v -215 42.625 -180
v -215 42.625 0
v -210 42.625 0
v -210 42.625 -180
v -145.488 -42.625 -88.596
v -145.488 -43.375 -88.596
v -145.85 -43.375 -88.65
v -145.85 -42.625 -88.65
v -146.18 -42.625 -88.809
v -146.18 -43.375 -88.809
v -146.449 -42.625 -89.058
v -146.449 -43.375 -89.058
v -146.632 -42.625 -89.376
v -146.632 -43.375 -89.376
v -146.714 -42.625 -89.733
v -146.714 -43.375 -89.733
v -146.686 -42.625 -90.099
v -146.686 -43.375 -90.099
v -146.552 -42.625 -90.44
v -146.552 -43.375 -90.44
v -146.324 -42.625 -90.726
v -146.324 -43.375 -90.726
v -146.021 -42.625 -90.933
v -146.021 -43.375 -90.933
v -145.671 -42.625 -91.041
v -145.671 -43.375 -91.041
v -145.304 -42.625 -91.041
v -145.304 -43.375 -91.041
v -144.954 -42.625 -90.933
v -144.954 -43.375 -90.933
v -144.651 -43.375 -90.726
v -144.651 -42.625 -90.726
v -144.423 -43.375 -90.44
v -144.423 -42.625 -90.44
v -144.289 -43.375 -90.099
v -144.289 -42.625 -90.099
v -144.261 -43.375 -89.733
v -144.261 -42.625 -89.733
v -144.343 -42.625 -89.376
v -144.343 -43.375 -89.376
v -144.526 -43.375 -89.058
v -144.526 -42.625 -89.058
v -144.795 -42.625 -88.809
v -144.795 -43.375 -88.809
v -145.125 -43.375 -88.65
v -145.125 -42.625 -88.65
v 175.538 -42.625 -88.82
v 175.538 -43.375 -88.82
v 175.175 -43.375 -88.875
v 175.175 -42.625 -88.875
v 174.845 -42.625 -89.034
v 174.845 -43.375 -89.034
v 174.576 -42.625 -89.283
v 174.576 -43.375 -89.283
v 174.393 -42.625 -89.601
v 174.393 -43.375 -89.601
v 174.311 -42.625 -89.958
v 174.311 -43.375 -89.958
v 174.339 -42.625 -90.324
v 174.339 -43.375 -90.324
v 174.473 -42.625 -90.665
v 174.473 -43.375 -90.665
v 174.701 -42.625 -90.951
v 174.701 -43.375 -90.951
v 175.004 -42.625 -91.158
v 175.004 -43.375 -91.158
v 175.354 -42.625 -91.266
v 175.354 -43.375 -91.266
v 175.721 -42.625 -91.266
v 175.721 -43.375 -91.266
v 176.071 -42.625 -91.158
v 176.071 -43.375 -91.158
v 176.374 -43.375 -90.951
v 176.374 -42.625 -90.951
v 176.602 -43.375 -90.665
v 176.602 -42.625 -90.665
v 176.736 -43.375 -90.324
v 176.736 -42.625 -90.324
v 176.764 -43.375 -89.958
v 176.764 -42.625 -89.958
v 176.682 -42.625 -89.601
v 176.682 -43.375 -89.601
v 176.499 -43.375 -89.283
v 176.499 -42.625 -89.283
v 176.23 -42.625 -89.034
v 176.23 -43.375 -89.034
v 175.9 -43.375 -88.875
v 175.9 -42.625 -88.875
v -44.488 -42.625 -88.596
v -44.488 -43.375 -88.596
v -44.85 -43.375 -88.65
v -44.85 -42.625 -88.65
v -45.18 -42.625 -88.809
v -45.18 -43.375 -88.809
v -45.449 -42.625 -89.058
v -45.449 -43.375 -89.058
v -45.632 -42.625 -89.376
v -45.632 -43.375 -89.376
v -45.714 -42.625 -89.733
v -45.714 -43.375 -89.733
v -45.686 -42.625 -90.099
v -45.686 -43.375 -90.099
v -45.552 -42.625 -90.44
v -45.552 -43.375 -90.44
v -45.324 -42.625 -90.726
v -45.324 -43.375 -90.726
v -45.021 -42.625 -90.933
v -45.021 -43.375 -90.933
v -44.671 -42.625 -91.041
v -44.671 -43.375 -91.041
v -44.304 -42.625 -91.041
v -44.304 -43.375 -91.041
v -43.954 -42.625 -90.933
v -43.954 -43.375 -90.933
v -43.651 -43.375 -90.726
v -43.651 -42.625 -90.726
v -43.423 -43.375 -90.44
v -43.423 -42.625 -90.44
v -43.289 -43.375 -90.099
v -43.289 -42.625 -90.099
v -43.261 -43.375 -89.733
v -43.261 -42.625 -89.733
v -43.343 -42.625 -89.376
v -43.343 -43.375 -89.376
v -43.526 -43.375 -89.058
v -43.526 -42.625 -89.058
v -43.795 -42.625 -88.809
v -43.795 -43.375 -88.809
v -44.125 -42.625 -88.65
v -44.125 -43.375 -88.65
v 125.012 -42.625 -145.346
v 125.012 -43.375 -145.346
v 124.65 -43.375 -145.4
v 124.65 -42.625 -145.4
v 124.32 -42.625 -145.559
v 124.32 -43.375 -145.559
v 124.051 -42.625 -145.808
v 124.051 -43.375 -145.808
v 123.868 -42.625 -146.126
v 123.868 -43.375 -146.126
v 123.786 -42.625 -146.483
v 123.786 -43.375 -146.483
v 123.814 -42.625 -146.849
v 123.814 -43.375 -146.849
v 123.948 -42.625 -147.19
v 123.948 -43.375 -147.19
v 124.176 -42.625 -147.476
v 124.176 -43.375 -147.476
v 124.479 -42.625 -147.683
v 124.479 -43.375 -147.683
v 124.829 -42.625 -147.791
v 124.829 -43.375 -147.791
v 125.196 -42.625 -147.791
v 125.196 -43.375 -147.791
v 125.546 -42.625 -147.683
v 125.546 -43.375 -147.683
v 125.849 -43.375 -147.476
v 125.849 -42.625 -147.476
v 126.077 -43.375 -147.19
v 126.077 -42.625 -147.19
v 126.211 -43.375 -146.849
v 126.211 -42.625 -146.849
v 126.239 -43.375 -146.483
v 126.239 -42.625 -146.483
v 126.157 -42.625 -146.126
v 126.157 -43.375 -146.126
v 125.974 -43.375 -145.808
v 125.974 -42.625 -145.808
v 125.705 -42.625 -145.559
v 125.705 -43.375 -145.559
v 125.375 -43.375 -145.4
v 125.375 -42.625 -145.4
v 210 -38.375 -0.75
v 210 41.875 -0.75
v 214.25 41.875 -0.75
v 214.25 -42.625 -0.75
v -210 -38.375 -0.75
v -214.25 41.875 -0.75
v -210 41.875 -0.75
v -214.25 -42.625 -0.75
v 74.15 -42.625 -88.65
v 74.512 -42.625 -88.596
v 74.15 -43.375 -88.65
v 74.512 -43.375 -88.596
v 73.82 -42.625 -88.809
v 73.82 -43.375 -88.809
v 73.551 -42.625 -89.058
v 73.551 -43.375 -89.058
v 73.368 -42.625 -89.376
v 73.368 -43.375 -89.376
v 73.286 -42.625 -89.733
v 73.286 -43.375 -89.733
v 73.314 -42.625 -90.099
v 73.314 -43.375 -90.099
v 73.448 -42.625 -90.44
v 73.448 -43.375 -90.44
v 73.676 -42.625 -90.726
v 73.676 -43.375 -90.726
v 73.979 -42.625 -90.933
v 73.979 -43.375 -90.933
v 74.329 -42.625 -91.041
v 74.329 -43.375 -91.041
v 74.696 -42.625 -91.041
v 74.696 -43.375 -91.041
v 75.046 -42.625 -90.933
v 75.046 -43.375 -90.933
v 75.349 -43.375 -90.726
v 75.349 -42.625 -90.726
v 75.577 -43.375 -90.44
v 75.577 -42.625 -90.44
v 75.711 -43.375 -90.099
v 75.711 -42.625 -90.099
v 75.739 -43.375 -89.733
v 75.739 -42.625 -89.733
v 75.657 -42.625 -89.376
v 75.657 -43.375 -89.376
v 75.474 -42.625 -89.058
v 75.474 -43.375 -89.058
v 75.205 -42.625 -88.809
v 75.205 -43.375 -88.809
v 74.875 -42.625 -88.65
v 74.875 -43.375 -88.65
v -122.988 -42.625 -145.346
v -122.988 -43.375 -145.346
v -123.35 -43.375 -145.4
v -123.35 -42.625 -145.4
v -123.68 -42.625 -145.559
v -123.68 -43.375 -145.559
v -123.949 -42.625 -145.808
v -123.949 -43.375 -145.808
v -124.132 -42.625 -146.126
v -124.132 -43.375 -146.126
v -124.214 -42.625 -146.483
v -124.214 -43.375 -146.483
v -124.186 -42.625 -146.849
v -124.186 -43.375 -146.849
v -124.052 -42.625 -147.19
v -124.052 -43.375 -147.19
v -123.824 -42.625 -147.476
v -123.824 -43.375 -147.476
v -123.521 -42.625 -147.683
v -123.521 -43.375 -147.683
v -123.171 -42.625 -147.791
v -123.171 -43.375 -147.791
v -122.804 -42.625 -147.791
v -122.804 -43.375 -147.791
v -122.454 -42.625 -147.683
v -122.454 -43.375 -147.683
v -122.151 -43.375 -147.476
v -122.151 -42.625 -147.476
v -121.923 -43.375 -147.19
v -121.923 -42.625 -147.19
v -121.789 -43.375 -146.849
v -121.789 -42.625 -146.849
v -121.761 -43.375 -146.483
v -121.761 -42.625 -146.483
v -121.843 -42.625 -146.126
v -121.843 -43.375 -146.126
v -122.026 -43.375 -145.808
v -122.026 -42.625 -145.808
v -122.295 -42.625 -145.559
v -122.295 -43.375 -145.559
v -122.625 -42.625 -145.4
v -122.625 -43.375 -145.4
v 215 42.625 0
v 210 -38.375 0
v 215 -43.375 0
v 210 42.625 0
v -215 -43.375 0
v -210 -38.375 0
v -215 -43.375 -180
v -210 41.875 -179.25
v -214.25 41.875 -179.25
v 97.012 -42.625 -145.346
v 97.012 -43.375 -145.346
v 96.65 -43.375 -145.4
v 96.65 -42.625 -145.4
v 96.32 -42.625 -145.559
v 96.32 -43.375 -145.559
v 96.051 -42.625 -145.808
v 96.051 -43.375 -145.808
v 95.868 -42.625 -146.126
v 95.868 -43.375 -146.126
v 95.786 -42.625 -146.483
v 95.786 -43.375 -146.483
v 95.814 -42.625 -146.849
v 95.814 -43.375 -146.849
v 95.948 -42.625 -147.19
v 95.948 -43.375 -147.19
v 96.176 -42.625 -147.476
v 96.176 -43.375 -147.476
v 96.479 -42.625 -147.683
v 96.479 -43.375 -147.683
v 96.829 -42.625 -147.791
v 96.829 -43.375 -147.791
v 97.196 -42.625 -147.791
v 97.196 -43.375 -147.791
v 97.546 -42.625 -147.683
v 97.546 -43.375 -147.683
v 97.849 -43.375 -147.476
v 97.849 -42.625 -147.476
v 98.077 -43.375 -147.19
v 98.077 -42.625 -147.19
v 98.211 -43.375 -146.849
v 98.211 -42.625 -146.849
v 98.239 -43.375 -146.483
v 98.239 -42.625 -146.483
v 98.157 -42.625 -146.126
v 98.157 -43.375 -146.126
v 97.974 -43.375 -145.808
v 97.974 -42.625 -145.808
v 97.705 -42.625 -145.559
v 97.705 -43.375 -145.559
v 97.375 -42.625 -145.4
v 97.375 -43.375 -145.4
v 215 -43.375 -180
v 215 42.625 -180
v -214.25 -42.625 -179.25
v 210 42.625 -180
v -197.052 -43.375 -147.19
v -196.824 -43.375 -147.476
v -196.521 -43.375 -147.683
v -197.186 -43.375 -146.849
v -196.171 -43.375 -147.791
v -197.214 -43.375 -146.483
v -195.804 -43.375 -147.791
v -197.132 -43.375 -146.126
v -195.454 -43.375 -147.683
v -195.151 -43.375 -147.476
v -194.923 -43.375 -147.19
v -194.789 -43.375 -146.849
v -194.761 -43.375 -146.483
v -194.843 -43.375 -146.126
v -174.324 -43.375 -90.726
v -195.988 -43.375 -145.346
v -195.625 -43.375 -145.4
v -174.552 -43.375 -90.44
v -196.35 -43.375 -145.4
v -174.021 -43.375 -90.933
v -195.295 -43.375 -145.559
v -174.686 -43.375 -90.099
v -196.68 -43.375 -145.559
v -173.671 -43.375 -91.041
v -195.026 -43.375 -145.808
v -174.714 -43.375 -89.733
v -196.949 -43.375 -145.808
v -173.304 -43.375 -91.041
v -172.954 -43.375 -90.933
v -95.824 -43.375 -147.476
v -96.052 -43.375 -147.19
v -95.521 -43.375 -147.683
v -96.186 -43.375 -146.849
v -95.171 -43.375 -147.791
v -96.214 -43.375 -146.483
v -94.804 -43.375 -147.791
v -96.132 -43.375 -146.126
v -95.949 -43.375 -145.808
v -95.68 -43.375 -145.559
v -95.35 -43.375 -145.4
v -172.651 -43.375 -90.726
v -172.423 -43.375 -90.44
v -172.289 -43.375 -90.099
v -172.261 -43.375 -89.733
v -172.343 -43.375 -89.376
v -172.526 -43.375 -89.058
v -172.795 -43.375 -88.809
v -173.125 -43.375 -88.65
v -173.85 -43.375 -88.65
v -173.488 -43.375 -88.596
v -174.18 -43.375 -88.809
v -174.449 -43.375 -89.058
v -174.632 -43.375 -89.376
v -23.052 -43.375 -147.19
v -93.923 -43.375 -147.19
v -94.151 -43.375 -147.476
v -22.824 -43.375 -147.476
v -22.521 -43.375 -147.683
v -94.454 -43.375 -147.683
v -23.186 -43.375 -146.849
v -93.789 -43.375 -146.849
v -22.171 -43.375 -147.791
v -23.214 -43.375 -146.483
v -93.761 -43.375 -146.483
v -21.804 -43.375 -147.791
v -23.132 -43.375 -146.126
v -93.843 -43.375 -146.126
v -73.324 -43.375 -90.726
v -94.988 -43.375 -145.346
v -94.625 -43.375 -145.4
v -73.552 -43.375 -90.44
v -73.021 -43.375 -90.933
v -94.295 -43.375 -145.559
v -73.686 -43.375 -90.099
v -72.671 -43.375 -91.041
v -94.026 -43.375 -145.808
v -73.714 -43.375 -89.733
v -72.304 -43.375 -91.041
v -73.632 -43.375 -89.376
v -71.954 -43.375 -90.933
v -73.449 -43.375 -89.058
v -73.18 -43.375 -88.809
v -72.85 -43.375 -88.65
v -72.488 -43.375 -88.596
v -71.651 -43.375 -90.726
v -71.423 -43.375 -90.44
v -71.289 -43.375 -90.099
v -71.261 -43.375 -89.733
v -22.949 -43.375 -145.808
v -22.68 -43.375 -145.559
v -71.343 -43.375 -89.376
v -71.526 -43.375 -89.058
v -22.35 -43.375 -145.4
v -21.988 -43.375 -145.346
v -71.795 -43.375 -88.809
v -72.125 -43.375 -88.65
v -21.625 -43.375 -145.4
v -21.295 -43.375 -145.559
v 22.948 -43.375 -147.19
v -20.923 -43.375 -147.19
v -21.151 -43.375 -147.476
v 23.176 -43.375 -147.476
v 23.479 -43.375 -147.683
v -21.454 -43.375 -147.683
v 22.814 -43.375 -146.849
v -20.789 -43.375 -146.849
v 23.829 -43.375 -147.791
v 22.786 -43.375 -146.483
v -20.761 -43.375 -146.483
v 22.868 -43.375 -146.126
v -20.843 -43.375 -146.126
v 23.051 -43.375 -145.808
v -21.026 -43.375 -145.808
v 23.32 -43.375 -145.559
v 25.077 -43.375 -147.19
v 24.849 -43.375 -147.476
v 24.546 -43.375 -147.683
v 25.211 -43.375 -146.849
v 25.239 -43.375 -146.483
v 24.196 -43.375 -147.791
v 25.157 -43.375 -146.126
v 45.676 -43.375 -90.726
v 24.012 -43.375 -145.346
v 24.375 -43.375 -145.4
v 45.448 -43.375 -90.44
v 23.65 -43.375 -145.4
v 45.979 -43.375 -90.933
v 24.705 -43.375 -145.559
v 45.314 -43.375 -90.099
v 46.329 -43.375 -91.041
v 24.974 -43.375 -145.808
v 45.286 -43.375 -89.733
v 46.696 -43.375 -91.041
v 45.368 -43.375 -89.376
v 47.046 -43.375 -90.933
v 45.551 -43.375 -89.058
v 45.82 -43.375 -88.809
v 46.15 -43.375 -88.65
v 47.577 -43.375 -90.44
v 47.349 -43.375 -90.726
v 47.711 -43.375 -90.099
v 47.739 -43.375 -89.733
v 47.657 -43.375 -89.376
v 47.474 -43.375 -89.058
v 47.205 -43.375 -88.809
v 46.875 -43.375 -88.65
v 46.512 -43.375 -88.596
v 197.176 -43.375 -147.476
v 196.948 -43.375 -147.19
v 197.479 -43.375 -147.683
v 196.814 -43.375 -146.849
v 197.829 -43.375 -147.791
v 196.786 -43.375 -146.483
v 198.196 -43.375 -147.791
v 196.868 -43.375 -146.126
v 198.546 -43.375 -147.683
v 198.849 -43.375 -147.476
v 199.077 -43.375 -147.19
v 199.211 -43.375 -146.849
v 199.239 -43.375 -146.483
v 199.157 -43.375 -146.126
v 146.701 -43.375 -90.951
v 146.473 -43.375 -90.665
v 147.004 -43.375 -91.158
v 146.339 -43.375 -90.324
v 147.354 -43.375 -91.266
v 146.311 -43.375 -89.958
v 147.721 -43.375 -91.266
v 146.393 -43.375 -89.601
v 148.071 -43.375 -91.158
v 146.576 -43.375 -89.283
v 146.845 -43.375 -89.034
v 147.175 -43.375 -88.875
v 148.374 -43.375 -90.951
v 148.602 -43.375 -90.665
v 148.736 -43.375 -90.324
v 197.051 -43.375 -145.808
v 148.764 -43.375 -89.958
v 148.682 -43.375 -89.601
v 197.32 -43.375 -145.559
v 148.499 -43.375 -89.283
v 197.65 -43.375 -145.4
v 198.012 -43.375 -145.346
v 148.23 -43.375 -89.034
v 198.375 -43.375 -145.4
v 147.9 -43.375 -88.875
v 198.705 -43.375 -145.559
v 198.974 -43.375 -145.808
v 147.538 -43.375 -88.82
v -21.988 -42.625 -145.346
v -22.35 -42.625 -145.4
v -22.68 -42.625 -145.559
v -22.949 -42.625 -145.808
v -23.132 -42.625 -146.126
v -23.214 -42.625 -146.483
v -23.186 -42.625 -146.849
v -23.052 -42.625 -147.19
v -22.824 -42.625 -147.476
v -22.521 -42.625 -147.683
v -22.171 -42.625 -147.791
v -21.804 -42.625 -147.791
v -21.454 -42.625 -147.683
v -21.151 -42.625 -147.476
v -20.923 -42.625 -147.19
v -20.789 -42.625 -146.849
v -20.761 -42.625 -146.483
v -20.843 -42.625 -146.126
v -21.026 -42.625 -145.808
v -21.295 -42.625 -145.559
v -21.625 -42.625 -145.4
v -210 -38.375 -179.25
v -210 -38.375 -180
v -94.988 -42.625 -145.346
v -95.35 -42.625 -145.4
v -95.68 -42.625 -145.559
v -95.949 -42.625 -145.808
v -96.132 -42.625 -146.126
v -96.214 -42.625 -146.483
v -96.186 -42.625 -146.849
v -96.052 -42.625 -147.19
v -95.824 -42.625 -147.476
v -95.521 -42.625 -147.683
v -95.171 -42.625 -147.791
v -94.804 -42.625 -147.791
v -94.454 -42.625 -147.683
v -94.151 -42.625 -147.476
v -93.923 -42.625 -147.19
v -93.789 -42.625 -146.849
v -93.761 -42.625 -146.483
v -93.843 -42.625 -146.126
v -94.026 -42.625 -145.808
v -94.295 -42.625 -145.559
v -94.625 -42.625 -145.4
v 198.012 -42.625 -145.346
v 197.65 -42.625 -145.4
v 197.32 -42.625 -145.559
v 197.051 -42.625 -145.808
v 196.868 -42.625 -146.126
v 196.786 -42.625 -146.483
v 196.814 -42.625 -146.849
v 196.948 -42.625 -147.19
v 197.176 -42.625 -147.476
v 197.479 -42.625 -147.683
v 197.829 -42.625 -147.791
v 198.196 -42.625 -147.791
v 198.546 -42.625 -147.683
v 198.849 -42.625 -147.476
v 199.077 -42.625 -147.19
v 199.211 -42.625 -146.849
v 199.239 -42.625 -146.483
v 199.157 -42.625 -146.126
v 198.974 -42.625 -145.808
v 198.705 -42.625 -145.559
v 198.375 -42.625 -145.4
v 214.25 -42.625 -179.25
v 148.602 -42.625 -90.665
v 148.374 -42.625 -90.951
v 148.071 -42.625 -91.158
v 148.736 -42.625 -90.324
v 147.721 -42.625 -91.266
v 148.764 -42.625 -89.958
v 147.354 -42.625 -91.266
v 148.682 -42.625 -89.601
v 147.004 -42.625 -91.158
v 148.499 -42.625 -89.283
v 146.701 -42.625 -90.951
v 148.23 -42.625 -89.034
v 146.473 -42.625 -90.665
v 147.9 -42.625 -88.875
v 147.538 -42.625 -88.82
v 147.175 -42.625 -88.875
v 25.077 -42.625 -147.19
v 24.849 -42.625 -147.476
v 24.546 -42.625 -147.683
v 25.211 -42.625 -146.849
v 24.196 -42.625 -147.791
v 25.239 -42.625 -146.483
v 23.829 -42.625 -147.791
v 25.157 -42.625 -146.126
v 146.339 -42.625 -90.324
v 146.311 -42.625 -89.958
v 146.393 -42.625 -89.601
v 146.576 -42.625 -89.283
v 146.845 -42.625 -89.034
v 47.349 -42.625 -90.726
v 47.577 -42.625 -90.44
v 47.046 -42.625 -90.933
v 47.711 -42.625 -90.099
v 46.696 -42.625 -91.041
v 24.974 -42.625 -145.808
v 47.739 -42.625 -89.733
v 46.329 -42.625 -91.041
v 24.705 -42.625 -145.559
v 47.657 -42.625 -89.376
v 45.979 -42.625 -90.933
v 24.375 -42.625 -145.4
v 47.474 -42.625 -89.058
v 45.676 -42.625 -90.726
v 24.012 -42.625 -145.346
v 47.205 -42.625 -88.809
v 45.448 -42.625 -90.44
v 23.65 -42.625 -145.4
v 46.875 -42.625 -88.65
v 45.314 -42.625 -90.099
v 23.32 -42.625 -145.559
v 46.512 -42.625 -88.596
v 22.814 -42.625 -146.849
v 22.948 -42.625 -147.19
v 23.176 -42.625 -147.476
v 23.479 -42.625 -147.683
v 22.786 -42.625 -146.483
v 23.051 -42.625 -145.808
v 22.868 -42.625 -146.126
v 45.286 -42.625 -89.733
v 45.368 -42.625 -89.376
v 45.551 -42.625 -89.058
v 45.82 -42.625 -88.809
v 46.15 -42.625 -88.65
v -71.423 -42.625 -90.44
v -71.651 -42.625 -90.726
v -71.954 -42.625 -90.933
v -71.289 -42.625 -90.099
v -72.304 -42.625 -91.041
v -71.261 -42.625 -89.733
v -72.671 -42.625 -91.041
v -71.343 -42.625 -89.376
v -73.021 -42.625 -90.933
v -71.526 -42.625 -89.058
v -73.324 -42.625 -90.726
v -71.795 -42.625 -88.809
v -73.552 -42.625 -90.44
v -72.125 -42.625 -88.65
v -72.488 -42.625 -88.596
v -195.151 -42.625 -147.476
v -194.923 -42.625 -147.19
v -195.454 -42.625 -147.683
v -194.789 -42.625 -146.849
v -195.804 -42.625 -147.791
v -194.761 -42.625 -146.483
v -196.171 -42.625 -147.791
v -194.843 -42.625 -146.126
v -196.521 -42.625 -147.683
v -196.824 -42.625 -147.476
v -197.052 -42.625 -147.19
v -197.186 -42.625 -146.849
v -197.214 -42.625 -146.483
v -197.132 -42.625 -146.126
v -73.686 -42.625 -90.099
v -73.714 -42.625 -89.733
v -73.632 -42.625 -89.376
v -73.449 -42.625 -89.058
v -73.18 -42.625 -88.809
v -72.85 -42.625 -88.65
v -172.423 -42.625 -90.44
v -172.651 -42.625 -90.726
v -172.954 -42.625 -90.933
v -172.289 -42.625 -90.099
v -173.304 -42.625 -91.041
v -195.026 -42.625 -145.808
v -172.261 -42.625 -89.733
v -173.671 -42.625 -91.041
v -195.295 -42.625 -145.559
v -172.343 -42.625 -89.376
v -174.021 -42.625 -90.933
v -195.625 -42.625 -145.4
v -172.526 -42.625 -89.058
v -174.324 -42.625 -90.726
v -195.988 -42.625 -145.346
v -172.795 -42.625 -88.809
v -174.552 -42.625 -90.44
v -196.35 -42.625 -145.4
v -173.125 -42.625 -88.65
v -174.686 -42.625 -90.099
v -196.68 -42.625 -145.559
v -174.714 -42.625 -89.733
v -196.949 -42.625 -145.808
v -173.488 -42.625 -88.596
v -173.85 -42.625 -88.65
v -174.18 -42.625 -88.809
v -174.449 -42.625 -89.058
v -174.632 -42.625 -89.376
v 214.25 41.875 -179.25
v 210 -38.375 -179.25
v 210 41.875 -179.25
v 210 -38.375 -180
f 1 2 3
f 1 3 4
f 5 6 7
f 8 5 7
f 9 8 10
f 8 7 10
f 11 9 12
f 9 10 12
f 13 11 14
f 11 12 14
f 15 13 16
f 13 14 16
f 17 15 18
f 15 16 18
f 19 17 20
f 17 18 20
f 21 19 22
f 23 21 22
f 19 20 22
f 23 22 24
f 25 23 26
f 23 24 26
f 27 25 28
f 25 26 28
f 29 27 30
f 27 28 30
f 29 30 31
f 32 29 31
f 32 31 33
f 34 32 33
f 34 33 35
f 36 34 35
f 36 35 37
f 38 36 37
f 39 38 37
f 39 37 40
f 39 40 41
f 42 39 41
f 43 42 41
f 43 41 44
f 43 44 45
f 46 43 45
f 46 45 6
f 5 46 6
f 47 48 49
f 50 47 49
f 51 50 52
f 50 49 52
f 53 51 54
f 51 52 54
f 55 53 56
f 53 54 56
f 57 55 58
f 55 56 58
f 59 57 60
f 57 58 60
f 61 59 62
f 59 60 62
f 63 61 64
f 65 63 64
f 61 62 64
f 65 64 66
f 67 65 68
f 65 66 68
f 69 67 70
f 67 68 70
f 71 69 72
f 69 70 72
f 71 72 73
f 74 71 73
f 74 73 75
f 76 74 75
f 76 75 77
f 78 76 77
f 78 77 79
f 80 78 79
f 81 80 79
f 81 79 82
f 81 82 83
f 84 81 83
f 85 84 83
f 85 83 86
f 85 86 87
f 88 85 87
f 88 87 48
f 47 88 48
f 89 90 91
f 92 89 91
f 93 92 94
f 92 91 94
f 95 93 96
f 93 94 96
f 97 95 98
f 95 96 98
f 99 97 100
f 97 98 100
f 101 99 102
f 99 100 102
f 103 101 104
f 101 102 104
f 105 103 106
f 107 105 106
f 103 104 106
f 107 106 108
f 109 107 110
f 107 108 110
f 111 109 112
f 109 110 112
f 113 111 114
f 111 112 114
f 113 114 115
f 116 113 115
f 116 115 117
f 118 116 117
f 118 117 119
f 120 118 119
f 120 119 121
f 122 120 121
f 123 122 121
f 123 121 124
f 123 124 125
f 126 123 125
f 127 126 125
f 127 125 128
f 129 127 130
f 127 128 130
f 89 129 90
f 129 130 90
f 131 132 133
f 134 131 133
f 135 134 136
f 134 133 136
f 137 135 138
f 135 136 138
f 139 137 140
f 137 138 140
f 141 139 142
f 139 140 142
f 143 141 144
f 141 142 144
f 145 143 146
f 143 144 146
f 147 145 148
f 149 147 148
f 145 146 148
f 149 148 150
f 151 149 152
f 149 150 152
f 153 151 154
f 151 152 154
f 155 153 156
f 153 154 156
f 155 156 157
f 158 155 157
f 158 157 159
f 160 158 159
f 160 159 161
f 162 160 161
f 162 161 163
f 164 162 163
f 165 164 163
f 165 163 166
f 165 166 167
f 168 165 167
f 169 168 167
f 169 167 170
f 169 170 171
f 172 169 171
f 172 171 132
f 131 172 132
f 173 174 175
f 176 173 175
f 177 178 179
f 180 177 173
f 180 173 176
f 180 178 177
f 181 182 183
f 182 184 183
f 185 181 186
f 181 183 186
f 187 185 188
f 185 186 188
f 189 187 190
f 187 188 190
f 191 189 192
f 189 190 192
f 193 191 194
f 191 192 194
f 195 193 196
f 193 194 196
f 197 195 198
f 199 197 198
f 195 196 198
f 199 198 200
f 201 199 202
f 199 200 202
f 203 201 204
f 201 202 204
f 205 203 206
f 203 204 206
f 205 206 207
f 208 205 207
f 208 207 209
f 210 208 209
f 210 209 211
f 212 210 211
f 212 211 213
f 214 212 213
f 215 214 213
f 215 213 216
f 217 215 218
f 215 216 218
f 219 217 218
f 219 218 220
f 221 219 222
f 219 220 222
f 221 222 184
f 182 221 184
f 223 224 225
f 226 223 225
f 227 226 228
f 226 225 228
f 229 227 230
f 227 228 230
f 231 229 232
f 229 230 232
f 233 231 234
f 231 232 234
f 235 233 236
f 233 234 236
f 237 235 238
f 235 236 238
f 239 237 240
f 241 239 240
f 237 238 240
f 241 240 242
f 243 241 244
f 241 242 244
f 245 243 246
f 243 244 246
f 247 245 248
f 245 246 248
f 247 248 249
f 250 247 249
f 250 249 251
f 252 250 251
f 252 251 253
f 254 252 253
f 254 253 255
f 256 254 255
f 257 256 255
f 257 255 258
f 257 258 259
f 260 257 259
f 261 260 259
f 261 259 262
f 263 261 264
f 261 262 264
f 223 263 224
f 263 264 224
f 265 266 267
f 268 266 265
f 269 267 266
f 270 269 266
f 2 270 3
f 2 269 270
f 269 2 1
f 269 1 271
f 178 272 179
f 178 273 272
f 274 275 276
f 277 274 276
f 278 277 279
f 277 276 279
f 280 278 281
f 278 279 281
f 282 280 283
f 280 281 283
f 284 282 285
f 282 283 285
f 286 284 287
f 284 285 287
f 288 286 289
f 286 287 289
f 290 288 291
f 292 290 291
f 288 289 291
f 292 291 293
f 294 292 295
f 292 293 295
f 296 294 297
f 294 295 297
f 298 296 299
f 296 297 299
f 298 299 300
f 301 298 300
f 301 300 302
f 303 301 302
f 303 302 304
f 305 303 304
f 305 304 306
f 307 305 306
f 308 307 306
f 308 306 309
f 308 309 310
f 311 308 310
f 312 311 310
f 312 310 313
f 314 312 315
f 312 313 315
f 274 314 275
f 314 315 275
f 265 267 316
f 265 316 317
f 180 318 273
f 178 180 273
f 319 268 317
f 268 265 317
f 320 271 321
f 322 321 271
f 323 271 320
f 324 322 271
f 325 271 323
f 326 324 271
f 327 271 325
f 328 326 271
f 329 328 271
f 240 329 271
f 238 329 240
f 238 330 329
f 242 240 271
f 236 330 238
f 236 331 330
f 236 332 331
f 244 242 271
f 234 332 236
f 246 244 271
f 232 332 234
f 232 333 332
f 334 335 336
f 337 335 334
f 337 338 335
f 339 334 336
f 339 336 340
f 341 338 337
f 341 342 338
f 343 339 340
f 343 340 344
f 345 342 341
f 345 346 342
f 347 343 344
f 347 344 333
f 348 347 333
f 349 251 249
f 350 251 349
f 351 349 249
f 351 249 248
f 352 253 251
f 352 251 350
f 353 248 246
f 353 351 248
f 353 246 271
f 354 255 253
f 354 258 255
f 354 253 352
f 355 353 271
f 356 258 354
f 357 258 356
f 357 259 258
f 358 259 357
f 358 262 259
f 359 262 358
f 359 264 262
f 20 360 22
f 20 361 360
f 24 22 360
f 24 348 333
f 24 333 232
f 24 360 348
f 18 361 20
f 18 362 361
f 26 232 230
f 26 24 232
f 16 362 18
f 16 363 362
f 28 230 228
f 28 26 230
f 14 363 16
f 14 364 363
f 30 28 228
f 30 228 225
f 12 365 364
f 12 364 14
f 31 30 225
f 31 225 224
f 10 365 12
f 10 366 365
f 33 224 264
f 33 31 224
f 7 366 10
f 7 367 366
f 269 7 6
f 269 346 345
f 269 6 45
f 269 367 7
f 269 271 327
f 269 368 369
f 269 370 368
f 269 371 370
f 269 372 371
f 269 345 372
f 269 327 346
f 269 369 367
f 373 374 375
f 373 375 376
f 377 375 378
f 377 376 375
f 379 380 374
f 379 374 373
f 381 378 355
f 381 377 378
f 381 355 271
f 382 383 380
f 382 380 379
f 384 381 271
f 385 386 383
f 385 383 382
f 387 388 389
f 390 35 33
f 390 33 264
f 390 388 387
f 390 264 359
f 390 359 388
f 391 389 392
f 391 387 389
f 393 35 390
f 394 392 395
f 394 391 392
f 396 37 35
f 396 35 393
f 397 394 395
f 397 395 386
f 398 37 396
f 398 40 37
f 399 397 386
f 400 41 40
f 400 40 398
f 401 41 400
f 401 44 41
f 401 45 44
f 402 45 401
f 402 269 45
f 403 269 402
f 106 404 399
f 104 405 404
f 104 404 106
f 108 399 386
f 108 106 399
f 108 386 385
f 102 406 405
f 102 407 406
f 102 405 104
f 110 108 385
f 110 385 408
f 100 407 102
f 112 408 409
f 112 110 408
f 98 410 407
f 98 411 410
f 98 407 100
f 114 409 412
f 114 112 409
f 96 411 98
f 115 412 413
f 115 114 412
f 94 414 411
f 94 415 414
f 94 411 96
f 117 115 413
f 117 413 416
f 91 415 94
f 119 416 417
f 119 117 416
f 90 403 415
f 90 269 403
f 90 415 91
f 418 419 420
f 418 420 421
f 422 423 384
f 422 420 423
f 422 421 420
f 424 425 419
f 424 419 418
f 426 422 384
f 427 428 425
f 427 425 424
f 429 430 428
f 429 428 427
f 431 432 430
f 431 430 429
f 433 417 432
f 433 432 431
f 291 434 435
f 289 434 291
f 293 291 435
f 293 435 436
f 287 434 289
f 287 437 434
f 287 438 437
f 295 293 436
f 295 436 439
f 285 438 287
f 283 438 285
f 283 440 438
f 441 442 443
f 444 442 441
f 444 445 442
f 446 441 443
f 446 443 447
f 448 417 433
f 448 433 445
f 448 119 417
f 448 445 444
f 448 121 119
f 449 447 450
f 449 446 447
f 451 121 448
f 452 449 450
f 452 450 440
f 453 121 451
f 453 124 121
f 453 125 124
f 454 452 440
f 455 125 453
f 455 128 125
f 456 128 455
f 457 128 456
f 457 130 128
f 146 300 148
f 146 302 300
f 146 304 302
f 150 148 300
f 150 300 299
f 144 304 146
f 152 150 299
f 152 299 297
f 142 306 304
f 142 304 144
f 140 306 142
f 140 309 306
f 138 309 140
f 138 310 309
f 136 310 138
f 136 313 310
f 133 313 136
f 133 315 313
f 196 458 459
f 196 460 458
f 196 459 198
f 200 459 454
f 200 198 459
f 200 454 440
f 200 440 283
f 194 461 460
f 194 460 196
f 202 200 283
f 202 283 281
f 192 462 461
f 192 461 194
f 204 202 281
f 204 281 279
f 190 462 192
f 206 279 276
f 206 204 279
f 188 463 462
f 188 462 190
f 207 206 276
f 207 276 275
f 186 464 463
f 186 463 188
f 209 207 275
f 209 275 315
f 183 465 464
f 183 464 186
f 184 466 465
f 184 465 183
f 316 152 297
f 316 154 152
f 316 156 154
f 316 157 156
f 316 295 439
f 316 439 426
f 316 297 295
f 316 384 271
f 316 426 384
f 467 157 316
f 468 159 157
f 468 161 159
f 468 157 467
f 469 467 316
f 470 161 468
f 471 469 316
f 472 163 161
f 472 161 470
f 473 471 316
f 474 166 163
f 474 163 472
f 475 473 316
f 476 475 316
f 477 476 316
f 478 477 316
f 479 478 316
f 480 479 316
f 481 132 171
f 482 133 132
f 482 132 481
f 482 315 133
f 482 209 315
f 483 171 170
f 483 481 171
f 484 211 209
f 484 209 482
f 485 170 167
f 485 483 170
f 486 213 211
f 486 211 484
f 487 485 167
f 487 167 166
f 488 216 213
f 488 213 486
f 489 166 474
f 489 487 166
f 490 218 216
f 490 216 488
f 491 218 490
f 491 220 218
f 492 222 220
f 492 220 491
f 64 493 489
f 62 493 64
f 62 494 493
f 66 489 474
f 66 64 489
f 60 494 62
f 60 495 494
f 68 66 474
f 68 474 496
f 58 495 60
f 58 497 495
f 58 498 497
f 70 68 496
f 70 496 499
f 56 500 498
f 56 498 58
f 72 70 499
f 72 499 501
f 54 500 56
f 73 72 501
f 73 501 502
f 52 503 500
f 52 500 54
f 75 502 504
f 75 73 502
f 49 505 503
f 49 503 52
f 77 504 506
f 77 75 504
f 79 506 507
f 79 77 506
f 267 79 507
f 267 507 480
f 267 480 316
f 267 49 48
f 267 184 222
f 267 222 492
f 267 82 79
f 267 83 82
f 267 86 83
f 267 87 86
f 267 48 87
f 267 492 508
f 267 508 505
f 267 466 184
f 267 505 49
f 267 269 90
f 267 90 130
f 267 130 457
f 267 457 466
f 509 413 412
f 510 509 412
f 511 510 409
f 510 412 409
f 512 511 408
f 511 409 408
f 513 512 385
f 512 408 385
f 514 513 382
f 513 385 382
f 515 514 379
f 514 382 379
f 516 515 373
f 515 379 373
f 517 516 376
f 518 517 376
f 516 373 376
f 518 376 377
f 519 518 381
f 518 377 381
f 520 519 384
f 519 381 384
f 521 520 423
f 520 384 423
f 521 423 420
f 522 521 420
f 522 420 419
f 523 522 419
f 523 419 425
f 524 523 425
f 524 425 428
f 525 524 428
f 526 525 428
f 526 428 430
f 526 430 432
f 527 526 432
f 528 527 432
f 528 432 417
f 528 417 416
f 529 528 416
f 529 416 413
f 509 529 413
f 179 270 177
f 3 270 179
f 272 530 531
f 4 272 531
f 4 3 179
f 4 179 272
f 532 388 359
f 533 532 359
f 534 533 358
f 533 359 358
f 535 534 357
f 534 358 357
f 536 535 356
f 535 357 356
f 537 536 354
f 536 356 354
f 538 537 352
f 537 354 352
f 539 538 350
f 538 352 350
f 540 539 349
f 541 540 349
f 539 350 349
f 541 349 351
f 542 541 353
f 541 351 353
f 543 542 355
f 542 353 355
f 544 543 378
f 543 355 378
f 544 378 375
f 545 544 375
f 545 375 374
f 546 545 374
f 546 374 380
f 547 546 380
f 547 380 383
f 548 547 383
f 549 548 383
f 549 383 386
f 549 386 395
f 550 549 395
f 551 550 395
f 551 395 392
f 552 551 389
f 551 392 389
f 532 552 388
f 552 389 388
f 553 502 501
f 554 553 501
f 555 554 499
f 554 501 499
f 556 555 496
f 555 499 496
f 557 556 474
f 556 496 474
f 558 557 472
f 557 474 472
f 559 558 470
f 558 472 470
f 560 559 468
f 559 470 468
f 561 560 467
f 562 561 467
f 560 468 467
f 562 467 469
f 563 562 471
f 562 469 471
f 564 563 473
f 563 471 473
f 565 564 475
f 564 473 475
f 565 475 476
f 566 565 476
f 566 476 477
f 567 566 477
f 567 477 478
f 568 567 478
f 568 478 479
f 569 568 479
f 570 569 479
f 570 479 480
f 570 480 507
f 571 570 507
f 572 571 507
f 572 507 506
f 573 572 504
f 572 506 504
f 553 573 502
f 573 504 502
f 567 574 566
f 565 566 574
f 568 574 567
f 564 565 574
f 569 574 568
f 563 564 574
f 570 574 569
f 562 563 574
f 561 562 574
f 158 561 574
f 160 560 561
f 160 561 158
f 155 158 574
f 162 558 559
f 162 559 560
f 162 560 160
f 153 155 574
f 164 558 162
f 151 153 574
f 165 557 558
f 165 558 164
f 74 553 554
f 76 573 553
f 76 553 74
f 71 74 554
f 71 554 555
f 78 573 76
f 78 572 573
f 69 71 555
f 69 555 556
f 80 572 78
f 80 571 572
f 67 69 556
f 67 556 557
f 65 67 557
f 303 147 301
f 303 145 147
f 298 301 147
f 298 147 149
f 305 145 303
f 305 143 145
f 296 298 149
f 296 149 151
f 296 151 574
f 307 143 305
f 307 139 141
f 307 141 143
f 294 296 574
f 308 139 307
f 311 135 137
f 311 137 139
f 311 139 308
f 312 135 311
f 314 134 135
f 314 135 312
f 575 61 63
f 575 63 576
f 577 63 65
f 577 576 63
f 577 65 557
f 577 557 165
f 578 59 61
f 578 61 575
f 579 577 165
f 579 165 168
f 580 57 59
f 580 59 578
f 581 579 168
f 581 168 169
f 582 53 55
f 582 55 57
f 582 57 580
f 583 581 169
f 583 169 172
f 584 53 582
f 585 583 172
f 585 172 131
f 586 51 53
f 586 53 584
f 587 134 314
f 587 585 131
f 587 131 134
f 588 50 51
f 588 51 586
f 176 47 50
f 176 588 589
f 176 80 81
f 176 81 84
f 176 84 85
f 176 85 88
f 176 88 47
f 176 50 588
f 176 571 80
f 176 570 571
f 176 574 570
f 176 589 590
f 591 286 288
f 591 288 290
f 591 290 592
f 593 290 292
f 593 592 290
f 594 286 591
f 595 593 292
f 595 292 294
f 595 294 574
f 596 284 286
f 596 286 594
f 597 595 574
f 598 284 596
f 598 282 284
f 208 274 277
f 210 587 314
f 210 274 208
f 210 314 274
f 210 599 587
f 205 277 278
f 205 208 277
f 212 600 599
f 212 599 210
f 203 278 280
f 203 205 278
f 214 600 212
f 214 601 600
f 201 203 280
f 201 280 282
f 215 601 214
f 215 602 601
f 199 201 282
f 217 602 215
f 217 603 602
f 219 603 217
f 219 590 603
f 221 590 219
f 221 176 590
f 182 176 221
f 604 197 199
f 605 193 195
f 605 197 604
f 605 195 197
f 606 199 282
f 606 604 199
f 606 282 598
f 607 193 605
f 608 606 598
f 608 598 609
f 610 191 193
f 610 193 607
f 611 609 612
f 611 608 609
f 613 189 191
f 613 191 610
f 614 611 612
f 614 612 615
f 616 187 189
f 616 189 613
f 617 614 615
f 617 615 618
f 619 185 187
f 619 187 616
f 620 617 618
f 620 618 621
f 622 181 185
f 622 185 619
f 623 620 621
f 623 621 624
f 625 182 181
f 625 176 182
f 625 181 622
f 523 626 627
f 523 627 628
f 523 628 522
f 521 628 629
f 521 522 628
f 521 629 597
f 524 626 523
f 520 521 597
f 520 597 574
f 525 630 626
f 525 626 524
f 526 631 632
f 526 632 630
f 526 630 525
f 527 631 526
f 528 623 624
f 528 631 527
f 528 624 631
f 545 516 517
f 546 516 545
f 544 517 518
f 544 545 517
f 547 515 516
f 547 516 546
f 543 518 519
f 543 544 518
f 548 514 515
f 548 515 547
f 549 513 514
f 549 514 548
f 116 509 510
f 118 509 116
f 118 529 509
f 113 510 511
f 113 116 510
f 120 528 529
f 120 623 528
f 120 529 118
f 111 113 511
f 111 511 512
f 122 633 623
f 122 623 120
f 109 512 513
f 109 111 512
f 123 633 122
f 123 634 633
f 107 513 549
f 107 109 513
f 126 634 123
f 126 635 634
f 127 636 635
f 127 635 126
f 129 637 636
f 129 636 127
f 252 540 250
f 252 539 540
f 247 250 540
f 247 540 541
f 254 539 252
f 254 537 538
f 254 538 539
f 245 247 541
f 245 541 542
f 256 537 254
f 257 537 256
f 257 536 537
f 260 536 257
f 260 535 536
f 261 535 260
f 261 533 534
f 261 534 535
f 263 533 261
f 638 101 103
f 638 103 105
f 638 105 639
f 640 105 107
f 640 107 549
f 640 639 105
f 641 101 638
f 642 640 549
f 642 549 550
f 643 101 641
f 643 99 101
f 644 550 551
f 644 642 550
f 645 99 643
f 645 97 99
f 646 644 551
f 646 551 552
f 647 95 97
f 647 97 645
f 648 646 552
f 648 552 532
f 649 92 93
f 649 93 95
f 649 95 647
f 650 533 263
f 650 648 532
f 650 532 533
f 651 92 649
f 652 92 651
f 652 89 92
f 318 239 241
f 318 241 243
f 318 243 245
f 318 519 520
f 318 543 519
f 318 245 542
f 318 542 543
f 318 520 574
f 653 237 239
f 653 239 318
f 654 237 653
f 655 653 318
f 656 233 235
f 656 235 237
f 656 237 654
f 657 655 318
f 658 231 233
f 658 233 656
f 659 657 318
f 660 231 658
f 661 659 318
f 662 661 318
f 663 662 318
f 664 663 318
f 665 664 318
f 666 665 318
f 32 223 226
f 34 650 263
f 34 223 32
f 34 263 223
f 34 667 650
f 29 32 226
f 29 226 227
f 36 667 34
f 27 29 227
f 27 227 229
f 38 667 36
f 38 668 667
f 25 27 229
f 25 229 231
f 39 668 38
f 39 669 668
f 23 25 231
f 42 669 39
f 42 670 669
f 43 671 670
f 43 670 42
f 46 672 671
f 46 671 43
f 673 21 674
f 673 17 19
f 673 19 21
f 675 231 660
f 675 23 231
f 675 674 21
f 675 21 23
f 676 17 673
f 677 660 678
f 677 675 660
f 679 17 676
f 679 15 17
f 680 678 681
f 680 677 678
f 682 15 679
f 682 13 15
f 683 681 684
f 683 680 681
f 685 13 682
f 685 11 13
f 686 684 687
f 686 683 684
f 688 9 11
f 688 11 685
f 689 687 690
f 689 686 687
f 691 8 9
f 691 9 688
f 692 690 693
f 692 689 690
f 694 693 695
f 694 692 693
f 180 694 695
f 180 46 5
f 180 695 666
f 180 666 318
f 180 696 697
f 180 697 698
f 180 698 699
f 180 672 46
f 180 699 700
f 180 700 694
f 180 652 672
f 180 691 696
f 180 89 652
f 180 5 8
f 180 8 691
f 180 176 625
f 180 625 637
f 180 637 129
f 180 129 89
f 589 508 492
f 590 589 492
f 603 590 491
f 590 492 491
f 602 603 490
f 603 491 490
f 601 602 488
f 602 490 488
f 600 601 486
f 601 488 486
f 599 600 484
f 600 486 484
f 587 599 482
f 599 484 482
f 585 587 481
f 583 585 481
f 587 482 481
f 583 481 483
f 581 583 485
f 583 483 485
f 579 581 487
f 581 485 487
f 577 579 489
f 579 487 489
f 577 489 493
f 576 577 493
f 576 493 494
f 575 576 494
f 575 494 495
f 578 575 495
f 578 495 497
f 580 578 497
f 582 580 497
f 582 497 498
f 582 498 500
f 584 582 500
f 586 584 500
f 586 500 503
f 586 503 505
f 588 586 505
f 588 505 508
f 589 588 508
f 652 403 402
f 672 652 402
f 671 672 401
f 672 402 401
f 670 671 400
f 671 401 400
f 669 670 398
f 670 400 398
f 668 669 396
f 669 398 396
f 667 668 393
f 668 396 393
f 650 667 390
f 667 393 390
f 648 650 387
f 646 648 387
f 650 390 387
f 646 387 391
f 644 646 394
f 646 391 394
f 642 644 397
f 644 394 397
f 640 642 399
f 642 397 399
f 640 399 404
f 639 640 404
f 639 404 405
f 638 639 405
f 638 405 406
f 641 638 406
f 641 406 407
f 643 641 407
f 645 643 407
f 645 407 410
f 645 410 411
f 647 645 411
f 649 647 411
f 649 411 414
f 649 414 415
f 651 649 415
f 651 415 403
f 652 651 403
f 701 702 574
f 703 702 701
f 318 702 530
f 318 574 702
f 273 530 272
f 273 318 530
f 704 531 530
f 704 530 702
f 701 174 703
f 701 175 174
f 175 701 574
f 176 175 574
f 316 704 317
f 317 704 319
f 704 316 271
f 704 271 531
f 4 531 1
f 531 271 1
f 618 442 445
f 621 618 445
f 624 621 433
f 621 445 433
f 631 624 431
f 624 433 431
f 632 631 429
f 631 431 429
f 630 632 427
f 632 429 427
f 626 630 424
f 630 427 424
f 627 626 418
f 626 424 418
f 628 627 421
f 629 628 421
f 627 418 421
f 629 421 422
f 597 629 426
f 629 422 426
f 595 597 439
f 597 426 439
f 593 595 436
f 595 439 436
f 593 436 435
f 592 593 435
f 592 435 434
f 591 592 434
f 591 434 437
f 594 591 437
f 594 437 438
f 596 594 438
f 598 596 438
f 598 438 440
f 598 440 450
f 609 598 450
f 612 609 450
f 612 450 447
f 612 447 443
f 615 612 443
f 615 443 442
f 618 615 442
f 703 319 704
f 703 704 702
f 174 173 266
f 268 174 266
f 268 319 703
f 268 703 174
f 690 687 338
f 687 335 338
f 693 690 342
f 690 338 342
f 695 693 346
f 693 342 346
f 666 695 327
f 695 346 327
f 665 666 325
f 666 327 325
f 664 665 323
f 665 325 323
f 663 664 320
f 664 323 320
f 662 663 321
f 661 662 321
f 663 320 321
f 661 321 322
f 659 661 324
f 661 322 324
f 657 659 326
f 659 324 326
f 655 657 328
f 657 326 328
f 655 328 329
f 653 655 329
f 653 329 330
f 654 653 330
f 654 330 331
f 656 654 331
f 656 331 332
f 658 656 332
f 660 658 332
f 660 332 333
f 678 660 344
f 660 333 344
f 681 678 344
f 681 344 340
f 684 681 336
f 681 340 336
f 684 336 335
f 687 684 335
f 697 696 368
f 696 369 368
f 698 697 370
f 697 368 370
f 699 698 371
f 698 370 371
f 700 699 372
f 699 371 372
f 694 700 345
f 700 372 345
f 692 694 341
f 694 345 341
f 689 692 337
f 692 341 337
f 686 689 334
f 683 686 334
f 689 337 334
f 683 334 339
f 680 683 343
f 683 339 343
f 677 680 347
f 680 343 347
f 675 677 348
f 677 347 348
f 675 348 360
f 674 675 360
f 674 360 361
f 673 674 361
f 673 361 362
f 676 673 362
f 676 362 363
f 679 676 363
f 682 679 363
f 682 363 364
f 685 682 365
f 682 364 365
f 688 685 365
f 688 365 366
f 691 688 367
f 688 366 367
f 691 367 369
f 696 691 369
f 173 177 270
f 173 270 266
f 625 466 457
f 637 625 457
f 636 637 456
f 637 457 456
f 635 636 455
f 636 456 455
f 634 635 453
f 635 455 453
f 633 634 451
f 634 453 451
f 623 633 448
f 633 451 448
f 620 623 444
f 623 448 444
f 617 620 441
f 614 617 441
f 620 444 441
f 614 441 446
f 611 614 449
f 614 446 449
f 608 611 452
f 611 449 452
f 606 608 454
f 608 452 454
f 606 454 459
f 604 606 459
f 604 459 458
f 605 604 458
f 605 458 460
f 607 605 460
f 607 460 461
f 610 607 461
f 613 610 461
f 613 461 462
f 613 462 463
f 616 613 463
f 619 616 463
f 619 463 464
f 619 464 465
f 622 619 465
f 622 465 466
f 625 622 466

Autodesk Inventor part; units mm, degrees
ref_plane "YZ Plane" through (0, 0, 0) normal (1, 0, 0) x (0, 1, 0)
ref_plane "XZ Plane" through (0, 0, 0) normal (0, 1, 0) x (-1, 0, 0)
ref_plane "XY Plane" through (0, 0, 0) normal (0, 0, 1) x (1, 0, 0)
sketch "Esboço9" plane through (0, 0, 0) normal (0, 0, 1) x (1, 0, 0)
  line L0 (-215, -43.375) -> (215, -43.375)
  line L1 (215, -43.375) -> (215, 42.625)
  line L2 (215, 42.625) -> (214.25, 42.625)
  line L3 (214.25, 42.625) -> (214.25, -42.625)
  line L4 (214.25, -42.625) -> (-214.25, -42.625)
  line L5 (-214.25, -42.625) -> (-214.25, 42.625)
  line L6 (-214.25, 42.625) -> (-215, 42.625)
  line L7 (-215, 42.625) -> (-215, -43.375)
  point P0 (0, 0)
  dimension "d60" = 430
  dimension "d61" = 86
  dimension "d64" = 85.25
  dimension "d65" = 428.5
  dimension "d67" = 0.75
  dimension "d107" = 214.25
  dimension "d109" = 42.625
extrude "Extrusão6" add sketch "Esboço9" against normal blind 180
sketch "Esboço10" plane through (-214.25, -42.625, 0) normal (0, 1, 0) x (1, 0, 0)
  line L0 (428.5, 0) -> (0, 0) projected
  line L1 (428.5, 0) -> (428.5, 0.75)
  line L2 (428.5, 0) -> (428.5, 180) projected
  line L3 (428.5, 0.75) -> (0, 0.75)
  line L4 (0, 0) -> (0, 180) projected
  line L5 (0, 180) -> (428.5, 180) projected
  line L6 (0, 180) -> (0, 179.25)
  line L7 (0, 0) -> (0, 180) projected
  line L8 (0, 179.25) -> (428.5, 179.25)
  line L9 (428.5, 179.25) -> (428.5, 180)
  line L10 (429.25, 180) -> (-0.75, 180) projected
  line L11 (0, 0.75) -> (0, 0)
  line L12 (-0.75, 0) -> (429.25, 0) projected
  line L13 (0, 180) -> (428.5, 180)
  point P0 (214.25, 0)
  dimension "d95" = 0.75
  dimension "d96" = 0.75
extrude "Extrusão7" add sketch "Esboço10" along normal blind 4.25 contours L0 L4 L3 L1 | L8 L4 L5 L2
sketch "Esboço11" plane through (214.25, 42.625, -180) normal (-1, 0, 0) x (0, 0, 1)
  line L0 (0, -81) -> (0.75, -81) projected
  line L1 (0.75, -81) -> (0, -81)
  line L2 (180, 0) -> (0, 0) projected
  line L3 (0, -81) -> (0, 0)
  line L4 (180, 0) -> (180, -81) projected
  line L5 (0, 0) -> (180, 0)
  line L6 (180, 0) -> (180, -81)
  line L7 (179.25, -81) -> (180, -81) projected
  line L8 (180, -81) -> (179.25, -81)
  line L9 (179.25, -81) -> (179.25, -0.75)
  line L10 (179.25, -0.75) -> (0.75, -0.75)
  line L11 (0.75, -0.75) -> (0.75, -81)
  point P0 (180, -42.625)
  dimension "d100" = 178.5
  dimension "d110" = 81
  dimension "d111" = 80.25
extrude "Extrusão8" add sketch "Esboço11" along normal blind 4.25
sketch "Esboço12" plane through (-214.25, 42.625, 0) normal (1, 0, 0) x (0, 0, -1)
  line L0 (0, -81) -> (0.75, -81) projected
  line L1 (0.75, -81) -> (0, -81)
  line L2 (0, -81) -> (0, 0)
  line L3 (180, -86) -> (180, 0) projected
  line L4 (0, 0) -> (180, 0)
  line L5 (179.25, -81) -> (180, -81) projected
  line L6 (180, 0) -> (180, -81)
  line L7 (180, -81) -> (179.25, -81)
  line L8 (179.25, -81) -> (179.25, -0.75)
  line L9 (179.25, -0.75) -> (0.75, -0.75)
  line L10 (0, -81) -> (0, 0) projected
  line L11 (0.75, -0.75) -> (0.75, -81)
  point P0 (0, -42.625)
  dimension "d103" = 80.25
  dimension "d104" = 178.5
  dimension "d112" = 81
extrude "Extrusão9" add sketch "Esboço12" along normal blind 4.25
sketch "Esboço15" plane through (-214.25, -42.625, -0.75) normal (0, 1, 0) x (1, 0, 0)
  circle A0 centre (311.2625, 145.825) radius 1.75 projected
  circle A1 centre (288.7625, 89.075) radius 1.75 projected
  line L0 (0, 0) -> (428.5, 0) projected
  line L1 (428.5, 0) -> (428.5, 178.5) projected
  line L2 (428.5, 178.5) -> (0, 178.5) projected
  line L3 (0, 0) -> (0, 178.5) projected
  circle A2 centre (260.7625, 89.075) radius 1.75 projected
  circle A3 centre (238.2625, 145.825) radius 1.75 projected
  circle A4 centre (192.2625, 145.825) radius 1.75 projected
  circle A5 centre (169.7625, 89.075) radius 1.75 projected
  circle A6 centre (141.7625, 89.075) radius 1.75 projected
  circle A7 centre (119.2625, 145.825) radius 1.75 projected
  circle A8 centre (91.2625, 145.825) radius 1.75 projected
  circle A9 centre (68.7625, 89.075) radius 1.75 projected
  circle A10 centre (40.7625, 89.075) radius 1.75 projected
  circle A11 centre (18.2625, 145.825) radius 1.75 projected
  circle A12 centre (339.2625, 145.825) radius 1.75 projected
  circle A13 centre (389.7875, 89.3) radius 1.75 projected
  circle A14 centre (412.2625, 145.825) radius 1.75 projected
  circle A15 centre (361.7875, 89.3) radius 1.75 projected
  point P0 (214.25, -0.75)
hole "Furo5" at (-195.9875, -42.625, -146.575) at (-122.9875, -42.625, -146.575) at (-145.4875, -42.625, -89.825) at (-173.4875, -42.625, -89.825) at (-94.9875, -42.625, -146.575) at (-72.4875, -42.625, -89.825) at (-44.4875, -42.625, -89.825) at (-21.9875, -42.625, -146.575) at (24.0125, -42.625, -146.575) at (46.5125, -42.625, -89.825) at (74.5125, -42.625, -89.825) at (97.0125, -42.625, -146.575) at (125.0125, -42.625, -146.575) at (198.0125, -42.625, -146.575) at (175.5375, -42.625, -90.05) at (147.5375, -42.625, -90.05) direction (0, -1, 0) diameter 2.459 end through all thread size "M3x0.5" class "6H" standard "ANSI Metric M Profile"
equation "\"d107\" = 0.5 * d65"
equation "\"d109\" = 0.5 * d64"
properties part number "Ra-Manager_Base"
